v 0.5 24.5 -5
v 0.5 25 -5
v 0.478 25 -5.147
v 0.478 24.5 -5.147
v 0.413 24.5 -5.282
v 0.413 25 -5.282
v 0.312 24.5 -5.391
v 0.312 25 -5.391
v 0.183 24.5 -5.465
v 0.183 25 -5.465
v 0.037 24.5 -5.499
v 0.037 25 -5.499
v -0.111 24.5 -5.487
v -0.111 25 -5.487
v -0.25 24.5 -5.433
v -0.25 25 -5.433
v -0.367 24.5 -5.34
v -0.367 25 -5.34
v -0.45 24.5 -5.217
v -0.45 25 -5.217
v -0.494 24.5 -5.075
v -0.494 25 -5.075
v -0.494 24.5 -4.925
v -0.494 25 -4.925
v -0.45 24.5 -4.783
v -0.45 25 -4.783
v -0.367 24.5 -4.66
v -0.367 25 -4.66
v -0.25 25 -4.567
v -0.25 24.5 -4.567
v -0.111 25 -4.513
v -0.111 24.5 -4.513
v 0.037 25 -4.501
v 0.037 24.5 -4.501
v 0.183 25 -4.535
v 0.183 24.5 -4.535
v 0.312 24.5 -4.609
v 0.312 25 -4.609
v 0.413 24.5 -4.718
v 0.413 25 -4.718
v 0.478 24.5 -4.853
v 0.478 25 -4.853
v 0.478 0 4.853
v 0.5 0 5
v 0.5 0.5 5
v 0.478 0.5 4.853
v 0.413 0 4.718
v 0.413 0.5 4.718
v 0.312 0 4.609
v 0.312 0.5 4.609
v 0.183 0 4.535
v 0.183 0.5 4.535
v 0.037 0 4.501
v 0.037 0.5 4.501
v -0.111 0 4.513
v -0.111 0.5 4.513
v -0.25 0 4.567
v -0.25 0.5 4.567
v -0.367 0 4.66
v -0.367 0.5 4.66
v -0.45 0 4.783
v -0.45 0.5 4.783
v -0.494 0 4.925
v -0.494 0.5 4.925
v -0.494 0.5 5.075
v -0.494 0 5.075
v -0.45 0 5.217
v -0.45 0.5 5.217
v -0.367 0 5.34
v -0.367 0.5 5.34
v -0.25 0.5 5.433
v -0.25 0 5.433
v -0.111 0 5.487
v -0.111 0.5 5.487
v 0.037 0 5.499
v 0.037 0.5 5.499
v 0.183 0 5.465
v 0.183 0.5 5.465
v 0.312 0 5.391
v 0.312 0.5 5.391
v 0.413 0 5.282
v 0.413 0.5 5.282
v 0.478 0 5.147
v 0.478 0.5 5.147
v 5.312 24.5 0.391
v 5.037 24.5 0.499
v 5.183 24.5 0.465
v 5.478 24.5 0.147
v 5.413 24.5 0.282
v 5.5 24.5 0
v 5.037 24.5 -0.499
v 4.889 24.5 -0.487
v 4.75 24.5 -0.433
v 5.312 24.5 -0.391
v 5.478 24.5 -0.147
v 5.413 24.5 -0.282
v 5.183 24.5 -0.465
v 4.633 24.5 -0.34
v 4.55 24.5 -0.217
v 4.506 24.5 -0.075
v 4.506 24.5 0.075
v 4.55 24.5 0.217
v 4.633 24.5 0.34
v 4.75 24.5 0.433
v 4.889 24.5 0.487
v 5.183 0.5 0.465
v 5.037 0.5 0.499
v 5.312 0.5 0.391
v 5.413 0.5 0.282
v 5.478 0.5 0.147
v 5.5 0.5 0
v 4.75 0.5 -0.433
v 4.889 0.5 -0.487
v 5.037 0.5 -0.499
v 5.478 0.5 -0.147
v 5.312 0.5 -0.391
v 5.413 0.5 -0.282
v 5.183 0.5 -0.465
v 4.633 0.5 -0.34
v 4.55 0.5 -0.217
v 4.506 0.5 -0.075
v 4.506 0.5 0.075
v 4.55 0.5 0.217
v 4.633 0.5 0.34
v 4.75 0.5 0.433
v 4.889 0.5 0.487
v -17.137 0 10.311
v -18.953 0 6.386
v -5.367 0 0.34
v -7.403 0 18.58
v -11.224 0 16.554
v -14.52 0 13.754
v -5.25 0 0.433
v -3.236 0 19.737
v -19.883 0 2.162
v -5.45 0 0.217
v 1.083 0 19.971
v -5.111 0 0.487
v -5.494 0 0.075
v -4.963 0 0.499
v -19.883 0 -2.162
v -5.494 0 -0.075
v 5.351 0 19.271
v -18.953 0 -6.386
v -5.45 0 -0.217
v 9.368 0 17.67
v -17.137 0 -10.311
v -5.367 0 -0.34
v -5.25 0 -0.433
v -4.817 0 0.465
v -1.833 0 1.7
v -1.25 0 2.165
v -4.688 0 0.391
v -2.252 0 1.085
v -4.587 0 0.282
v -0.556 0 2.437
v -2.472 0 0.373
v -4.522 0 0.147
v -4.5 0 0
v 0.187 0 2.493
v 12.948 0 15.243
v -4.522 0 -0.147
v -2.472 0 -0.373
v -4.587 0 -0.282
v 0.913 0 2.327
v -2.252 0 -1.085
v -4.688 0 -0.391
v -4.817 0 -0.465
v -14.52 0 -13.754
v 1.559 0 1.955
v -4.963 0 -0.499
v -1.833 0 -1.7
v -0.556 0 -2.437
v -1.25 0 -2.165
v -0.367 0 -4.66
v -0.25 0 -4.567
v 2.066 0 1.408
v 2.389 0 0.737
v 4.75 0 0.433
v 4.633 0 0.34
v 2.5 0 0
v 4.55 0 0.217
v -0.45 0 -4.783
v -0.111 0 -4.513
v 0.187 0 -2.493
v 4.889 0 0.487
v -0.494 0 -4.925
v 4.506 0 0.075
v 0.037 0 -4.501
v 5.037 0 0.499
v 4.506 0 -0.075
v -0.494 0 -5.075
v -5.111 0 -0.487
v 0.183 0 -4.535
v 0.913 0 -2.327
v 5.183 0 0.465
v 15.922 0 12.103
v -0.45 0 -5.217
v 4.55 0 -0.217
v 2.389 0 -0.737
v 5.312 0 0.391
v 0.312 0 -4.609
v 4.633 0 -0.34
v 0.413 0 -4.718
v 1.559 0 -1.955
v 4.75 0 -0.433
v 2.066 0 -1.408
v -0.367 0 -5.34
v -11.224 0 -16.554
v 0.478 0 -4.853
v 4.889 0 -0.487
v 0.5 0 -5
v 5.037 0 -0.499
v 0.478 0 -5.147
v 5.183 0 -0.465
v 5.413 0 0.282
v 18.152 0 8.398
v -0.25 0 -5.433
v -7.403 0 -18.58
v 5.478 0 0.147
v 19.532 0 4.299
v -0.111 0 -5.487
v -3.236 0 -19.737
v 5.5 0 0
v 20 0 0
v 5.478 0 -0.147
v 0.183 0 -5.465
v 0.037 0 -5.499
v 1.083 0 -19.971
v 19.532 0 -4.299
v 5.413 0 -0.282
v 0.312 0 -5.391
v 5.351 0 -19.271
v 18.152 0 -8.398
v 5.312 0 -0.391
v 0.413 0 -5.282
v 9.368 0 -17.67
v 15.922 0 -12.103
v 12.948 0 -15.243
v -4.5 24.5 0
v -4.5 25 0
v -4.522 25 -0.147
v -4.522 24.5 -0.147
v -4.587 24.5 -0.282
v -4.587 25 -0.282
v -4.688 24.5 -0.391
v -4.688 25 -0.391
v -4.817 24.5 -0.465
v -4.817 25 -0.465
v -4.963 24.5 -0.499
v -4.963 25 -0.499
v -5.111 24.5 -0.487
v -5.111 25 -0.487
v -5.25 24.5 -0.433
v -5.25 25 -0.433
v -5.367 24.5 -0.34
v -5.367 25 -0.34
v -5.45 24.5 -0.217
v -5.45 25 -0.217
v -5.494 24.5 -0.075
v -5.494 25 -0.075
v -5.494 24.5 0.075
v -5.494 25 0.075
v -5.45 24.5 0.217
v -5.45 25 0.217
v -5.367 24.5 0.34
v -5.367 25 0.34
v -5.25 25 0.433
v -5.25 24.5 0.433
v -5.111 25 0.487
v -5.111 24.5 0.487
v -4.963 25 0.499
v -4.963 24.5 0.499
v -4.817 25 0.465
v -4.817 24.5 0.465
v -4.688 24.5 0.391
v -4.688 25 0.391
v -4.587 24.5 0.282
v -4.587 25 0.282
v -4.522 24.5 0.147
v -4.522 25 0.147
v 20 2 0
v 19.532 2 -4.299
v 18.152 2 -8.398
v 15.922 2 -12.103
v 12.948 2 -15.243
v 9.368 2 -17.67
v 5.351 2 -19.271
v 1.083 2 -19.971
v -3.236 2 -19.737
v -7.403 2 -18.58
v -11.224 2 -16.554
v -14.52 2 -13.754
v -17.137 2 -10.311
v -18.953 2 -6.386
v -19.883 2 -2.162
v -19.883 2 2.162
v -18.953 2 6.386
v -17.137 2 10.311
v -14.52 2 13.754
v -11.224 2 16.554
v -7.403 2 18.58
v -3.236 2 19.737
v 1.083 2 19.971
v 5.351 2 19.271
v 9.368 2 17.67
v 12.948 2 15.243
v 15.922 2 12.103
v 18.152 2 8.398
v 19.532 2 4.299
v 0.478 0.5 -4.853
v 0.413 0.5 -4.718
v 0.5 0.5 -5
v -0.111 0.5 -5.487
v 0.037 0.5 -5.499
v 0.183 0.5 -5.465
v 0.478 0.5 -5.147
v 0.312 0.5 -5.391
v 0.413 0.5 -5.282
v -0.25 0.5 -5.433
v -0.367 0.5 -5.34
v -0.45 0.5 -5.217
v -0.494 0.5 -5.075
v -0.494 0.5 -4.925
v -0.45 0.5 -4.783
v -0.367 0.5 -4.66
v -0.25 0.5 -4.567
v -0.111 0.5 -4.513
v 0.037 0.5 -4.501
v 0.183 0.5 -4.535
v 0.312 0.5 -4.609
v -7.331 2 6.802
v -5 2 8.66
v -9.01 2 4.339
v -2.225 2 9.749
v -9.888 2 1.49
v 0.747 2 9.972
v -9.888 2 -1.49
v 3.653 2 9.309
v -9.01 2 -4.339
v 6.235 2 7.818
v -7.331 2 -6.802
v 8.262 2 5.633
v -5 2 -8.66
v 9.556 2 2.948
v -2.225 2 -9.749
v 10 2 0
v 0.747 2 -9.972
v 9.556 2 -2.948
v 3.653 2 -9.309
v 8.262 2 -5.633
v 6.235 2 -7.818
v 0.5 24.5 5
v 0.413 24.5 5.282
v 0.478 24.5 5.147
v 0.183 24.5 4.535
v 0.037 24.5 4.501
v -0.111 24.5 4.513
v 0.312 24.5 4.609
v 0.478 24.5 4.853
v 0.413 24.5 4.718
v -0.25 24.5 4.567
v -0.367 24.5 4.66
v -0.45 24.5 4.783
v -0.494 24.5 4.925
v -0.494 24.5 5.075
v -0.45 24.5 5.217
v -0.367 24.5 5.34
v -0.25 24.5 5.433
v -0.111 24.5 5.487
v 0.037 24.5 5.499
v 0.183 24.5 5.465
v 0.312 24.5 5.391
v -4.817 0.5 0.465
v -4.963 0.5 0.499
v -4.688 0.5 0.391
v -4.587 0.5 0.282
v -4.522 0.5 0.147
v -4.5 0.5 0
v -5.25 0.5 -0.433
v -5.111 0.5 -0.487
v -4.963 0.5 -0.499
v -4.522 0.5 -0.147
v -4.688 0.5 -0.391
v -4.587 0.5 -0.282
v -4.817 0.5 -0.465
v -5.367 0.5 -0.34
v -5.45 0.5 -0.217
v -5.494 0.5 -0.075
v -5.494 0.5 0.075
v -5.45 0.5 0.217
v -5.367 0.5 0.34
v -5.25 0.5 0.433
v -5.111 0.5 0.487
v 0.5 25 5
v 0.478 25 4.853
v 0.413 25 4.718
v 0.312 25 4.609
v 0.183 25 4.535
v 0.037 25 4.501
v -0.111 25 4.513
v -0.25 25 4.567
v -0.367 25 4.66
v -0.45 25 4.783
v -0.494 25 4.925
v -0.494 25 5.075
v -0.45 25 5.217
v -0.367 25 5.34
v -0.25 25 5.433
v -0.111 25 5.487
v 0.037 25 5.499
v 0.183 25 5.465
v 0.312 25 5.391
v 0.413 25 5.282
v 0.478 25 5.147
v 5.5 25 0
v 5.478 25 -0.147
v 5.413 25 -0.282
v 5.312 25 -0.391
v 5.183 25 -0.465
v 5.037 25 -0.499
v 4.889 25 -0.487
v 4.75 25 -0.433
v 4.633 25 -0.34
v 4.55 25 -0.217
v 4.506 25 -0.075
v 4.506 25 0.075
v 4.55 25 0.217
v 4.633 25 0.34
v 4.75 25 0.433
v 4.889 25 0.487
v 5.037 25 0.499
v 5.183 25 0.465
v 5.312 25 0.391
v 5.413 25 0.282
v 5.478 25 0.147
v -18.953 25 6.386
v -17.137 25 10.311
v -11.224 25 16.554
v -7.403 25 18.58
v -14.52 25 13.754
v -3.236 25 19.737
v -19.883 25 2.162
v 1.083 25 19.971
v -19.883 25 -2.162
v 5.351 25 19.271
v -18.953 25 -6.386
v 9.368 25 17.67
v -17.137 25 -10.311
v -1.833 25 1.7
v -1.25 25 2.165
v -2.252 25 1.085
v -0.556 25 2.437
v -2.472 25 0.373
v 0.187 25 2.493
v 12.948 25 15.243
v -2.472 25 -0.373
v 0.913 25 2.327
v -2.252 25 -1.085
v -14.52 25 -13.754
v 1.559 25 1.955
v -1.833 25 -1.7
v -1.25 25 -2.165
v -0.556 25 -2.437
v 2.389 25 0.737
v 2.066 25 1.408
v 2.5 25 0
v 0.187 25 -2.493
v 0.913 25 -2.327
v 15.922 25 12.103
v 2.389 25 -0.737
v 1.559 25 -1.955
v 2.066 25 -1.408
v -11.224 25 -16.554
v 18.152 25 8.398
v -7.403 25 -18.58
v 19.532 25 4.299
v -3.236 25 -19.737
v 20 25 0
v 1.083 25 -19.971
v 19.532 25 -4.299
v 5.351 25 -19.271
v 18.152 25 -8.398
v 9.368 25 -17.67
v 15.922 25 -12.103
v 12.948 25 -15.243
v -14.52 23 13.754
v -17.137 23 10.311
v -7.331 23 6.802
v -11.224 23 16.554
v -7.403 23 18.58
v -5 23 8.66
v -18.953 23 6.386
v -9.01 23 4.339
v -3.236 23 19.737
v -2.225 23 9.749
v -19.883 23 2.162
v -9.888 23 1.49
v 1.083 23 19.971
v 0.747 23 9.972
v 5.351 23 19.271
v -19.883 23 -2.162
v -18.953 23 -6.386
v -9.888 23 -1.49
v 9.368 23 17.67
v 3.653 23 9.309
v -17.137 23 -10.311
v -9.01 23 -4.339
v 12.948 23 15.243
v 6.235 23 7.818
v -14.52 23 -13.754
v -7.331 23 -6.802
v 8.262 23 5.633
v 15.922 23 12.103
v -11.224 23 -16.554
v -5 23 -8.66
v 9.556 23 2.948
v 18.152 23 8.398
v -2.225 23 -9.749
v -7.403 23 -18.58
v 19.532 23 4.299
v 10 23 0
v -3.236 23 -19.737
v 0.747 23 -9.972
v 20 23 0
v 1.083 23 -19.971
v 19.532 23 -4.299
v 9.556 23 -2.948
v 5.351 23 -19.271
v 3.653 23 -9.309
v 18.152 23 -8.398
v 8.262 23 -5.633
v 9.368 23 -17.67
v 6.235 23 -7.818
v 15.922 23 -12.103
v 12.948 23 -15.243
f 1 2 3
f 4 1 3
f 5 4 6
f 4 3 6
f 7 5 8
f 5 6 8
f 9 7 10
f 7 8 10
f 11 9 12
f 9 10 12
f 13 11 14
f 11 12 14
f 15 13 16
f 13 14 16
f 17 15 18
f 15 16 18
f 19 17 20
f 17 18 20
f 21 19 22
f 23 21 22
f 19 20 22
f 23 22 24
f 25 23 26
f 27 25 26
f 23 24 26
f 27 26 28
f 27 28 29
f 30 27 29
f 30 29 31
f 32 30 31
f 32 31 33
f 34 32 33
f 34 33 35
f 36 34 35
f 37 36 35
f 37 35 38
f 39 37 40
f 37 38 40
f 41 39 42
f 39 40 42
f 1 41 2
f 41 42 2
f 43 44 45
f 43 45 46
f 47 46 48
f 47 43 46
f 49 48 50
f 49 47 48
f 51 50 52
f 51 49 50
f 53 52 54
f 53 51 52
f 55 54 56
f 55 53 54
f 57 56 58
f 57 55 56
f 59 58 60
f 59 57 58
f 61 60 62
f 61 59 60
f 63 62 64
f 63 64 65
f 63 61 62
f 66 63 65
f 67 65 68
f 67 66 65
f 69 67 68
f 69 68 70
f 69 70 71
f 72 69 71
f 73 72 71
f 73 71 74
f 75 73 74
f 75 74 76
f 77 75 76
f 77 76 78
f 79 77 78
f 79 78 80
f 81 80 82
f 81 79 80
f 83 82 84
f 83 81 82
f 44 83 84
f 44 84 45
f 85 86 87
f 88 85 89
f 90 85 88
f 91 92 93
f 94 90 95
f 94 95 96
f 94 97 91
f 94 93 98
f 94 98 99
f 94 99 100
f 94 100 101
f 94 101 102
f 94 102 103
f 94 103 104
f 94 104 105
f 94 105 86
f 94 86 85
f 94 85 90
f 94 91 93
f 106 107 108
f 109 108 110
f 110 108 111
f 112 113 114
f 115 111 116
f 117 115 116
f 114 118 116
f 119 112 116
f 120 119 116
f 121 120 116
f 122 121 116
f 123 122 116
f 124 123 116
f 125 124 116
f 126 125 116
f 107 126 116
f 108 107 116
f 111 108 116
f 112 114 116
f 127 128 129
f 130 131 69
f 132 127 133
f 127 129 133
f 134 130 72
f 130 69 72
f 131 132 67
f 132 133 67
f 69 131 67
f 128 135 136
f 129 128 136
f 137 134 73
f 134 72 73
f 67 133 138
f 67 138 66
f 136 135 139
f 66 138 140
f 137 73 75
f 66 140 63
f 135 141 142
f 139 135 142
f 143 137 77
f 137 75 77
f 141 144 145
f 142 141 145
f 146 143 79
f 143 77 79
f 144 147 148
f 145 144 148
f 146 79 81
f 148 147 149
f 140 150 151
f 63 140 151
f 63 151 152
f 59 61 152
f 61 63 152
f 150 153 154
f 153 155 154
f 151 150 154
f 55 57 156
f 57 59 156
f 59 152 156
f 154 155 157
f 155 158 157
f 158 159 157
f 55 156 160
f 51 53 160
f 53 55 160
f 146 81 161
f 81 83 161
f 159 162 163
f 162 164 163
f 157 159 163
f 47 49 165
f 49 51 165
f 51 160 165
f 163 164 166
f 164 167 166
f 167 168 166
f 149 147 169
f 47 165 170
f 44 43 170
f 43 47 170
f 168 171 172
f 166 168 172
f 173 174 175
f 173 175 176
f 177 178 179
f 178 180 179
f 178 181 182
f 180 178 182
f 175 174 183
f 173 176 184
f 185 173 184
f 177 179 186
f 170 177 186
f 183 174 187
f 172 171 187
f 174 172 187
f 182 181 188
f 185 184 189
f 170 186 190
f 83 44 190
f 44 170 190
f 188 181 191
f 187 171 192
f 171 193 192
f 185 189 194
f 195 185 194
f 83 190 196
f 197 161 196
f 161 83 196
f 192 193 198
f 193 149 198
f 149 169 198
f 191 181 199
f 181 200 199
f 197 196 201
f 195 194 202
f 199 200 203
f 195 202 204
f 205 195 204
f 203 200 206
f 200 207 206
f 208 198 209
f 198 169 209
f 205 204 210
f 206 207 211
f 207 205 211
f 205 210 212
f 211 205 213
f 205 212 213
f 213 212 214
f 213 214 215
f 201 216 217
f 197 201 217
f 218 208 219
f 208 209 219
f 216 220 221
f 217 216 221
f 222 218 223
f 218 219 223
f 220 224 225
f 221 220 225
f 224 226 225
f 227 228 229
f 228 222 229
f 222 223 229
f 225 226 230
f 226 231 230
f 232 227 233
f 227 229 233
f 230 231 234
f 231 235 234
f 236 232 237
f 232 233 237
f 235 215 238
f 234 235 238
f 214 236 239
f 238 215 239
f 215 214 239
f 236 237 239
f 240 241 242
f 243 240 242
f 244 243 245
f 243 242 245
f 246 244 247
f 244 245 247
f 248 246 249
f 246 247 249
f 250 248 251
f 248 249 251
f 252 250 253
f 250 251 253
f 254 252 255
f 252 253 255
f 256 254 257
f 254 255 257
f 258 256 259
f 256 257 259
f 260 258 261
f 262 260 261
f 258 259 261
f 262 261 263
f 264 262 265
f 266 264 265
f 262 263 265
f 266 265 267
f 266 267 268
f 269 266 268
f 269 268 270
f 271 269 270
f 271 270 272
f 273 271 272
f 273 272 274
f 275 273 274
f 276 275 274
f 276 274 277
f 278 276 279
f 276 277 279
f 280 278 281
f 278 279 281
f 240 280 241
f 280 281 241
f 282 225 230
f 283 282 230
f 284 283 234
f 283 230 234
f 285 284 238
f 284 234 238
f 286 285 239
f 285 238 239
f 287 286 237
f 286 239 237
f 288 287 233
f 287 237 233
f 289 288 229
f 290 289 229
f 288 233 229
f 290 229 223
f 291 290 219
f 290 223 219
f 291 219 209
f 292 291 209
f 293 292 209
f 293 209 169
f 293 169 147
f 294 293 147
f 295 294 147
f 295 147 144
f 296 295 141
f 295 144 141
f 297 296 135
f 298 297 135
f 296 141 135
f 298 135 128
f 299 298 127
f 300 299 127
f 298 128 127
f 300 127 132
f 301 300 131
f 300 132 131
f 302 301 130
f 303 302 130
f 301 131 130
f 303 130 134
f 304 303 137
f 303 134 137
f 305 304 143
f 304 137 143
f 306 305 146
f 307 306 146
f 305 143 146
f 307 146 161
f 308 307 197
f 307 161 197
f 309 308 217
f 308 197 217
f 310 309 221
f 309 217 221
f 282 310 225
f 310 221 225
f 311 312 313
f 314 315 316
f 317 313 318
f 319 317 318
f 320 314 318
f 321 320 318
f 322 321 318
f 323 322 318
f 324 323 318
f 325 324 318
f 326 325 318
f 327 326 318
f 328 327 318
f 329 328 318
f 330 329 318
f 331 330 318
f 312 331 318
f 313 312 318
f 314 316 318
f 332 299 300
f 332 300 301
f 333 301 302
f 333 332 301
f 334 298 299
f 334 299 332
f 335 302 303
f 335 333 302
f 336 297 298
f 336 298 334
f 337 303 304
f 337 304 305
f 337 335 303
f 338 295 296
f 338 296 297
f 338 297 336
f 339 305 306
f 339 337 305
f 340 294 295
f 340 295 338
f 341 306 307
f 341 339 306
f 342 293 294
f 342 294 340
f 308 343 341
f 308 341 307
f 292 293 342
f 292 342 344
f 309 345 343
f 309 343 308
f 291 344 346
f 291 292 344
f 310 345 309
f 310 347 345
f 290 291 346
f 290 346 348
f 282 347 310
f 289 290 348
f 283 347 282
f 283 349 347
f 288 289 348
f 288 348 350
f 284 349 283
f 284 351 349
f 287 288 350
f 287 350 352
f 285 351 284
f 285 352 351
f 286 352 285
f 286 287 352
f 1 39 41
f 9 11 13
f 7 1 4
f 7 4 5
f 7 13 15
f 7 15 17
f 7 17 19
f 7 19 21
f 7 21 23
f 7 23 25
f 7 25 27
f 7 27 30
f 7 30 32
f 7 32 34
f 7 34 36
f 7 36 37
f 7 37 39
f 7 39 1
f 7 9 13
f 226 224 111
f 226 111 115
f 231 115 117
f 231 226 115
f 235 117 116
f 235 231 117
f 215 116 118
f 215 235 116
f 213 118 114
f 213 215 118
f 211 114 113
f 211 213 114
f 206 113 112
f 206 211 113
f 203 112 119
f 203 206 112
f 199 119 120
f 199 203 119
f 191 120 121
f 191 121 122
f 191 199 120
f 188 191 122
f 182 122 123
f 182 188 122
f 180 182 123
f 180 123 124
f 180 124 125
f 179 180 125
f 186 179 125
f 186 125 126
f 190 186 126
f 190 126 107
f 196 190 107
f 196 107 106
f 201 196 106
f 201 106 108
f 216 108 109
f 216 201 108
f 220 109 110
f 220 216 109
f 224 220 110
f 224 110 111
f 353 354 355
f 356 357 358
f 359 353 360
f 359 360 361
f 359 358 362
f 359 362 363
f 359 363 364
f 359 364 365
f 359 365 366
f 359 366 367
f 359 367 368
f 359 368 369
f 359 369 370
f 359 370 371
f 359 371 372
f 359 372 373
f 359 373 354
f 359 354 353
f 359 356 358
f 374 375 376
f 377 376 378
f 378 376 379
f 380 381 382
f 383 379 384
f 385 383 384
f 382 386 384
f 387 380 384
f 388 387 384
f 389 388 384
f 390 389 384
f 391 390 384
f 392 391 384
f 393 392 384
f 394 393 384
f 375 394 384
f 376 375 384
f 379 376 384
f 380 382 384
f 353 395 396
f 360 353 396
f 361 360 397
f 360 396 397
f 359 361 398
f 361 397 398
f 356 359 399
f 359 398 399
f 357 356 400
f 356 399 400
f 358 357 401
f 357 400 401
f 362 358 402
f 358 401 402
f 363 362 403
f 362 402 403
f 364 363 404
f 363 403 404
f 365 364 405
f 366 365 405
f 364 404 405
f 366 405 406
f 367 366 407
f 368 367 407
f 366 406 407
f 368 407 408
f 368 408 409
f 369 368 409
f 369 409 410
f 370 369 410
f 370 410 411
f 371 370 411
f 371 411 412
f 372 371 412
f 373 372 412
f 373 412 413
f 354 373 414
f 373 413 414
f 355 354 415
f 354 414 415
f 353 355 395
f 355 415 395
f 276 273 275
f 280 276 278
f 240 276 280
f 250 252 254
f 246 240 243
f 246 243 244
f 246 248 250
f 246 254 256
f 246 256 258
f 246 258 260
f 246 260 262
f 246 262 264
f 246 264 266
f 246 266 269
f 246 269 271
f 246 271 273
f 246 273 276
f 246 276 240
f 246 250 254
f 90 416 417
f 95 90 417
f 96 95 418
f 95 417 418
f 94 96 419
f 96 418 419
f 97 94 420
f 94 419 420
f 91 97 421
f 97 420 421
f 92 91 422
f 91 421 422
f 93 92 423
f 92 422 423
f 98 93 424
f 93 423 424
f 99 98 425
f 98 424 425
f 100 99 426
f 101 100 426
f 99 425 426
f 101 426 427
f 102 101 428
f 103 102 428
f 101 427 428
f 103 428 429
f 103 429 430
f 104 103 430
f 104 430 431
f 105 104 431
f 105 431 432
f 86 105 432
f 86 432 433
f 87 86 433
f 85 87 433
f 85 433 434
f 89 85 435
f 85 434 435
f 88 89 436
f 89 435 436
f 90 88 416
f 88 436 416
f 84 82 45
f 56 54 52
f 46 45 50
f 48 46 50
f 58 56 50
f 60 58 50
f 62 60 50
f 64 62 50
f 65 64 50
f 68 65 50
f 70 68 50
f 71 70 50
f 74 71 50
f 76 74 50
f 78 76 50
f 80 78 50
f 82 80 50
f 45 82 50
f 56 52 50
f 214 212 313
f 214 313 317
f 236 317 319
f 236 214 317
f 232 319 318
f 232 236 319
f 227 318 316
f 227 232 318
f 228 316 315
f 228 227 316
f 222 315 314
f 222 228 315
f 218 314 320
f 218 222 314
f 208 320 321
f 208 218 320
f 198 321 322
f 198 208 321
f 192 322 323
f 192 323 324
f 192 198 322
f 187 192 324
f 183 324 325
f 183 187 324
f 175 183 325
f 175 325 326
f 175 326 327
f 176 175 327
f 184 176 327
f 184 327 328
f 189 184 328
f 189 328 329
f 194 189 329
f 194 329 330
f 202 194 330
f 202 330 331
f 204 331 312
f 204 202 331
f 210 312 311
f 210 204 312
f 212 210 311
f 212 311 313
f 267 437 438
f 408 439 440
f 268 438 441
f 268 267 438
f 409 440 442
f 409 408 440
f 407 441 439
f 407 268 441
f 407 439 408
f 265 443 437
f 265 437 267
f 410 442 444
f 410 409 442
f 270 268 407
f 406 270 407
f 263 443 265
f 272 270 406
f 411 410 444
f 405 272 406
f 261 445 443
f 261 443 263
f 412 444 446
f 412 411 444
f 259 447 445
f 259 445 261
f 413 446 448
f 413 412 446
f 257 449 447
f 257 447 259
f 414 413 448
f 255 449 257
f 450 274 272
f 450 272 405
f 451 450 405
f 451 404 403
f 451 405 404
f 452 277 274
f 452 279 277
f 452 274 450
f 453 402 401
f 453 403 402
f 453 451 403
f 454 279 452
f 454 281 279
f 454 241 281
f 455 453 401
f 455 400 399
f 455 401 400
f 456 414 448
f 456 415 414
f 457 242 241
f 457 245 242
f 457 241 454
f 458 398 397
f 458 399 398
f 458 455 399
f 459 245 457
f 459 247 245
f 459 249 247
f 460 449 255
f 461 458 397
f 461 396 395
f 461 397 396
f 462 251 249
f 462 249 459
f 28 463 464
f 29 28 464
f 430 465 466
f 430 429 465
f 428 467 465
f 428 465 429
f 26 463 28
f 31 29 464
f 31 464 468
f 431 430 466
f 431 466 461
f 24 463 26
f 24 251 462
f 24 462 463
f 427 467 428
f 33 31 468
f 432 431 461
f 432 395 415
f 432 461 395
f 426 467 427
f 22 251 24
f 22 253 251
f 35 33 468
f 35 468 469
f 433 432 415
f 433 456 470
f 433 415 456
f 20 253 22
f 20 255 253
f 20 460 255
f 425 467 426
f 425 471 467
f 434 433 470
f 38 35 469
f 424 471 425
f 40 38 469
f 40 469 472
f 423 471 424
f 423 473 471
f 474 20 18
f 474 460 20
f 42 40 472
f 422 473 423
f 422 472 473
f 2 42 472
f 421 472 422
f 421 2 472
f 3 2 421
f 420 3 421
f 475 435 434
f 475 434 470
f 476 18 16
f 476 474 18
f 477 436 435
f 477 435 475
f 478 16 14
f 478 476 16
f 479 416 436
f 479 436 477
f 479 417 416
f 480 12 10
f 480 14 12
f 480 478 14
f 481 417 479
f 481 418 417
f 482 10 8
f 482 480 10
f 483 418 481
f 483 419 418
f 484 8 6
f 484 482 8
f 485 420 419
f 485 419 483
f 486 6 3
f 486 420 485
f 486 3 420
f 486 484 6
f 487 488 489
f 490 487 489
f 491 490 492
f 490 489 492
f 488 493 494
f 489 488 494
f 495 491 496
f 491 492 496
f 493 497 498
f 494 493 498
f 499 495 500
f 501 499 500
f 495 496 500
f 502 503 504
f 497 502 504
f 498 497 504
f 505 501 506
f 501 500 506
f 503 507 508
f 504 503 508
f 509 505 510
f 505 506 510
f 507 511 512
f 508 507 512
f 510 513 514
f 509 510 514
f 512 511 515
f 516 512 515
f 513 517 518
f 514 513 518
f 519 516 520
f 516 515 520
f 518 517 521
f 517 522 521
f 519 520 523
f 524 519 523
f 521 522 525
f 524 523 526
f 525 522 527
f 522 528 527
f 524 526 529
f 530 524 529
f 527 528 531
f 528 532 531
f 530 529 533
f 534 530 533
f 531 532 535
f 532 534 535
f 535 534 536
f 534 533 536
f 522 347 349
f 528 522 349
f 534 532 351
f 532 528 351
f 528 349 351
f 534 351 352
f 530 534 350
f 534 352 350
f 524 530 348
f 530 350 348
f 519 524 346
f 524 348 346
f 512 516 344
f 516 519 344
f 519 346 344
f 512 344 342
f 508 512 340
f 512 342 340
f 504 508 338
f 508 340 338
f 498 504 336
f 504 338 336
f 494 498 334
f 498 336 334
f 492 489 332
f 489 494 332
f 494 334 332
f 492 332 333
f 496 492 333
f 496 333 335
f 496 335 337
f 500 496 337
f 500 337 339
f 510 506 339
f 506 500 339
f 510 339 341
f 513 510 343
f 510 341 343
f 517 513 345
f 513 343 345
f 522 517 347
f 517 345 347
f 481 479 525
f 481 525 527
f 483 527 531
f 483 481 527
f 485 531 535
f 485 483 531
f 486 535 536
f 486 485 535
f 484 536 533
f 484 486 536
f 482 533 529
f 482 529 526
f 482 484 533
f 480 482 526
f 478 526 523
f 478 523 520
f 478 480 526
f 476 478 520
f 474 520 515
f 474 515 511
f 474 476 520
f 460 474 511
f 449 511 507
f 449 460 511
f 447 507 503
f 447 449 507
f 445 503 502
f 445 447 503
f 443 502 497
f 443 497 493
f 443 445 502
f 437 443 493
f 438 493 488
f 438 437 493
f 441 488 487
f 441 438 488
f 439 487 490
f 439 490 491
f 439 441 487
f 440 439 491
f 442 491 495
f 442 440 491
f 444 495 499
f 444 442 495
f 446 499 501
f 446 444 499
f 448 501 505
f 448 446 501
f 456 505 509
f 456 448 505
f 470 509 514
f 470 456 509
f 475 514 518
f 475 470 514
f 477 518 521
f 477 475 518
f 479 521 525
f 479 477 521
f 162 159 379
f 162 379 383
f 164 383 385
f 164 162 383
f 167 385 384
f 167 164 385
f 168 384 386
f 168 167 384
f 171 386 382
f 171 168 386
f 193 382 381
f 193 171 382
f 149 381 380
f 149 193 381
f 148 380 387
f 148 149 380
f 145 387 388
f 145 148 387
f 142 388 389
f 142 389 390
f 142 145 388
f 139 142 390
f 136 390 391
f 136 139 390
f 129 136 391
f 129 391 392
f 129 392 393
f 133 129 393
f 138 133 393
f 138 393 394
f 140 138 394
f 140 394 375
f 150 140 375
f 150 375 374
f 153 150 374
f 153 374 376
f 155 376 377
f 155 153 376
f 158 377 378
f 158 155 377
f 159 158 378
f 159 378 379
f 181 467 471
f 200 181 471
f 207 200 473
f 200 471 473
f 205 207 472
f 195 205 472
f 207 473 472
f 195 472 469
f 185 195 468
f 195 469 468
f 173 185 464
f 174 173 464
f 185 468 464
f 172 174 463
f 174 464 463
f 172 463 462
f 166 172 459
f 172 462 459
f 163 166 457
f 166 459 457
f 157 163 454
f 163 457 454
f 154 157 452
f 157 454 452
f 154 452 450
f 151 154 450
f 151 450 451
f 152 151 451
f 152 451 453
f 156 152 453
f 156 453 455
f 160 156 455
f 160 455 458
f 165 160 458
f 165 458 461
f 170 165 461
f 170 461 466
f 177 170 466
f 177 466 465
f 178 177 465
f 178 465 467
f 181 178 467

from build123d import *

# Parameters (mm, degrees)
CROQUIS1_R              = 10
SALIENTE_EXTRUIR1_DEPTH = 25
CROQUIS2_R              = 20
SALIENTE_EXTRUIR2_DEPTH = 2
SALIENTE_EXTRUIR3_START = -23
CROQUIS2_2_R            = 20
SALIENTE_EXTRUIR3_DEPTH = 2
CROQUIS3_R              = 2.5
CORTAR_EXTRUIR1_DEPTH   = 38.749172176
CROQUIS4_R              = 0.5
CORTAR_EXTRUIR2_DEPTH   = 0.5
CORTAR_EXTRUIR3_START   = -24.5
CROQUIS4_2_R            = 0.5
CORTAR_EXTRUIR3_DEPTH   = 0.5


with BuildPart() as part:
    # Croquis1 → Saliente-Extruir1 (new body)
    with BuildSketch(Plane(origin=(0, 0, 0), x_dir=(1, 0, 0), z_dir=(0, 1, 0))):
        Circle(CROQUIS1_R)
    extrude(amount=SALIENTE_EXTRUIR1_DEPTH)

    # Croquis2 → Saliente-Extruir2 (add)
    with BuildSketch(Plane(origin=(0, 25, 0), x_dir=(1, 0, 0), z_dir=(0, 1, 0))):
        Circle(CROQUIS2_R)
    extrude(amount=-SALIENTE_EXTRUIR2_DEPTH)

    # Croquis2<2> → Saliente-Extruir3 (add)
    with BuildSketch(Plane(origin=(0, 25, 0), x_dir=(1, 0, 0), z_dir=(0, 1, 0)).offset(SALIENTE_EXTRUIR3_START)):
        Circle(CROQUIS2_2_R)
    extrude(amount=-SALIENTE_EXTRUIR3_DEPTH)

    # Croquis3 → Cortar-Extruir1 (cut, through all)
    with BuildSketch(Plane(origin=(0, 25, 0), x_dir=(1, 0, 0), z_dir=(0, 1, 0))):
        Circle(CROQUIS3_R)
    extrude(amount=-CORTAR_EXTRUIR1_DEPTH, mode=Mode.SUBTRACT)

    # Croquis4 → Cortar-Extruir2 (cut)
    with BuildSketch(Plane(origin=(0, 25, 0), x_dir=(1, 0, 0), z_dir=(0, 1, 0))):
        with Locations((0, 5)):
            Circle(CROQUIS4_R)
        with Locations((5, 0)):
            Circle(CROQUIS4_R)
        with Locations((0, -5)):
            Circle(CROQUIS4_R)
        with Locations((-5, 0)):
            Circle(CROQUIS4_R)
    extrude(amount=-CORTAR_EXTRUIR2_DEPTH, mode=Mode.SUBTRACT)

    # Croquis4<2> → Cortar-Extruir3 (cut)
    with BuildSketch(Plane(origin=(0, 25, 0), x_dir=(1, 0, 0), z_dir=(0, 1, 0)).offset(CORTAR_EXTRUIR3_START)):
        with Locations((0, 5)):
            Circle(CROQUIS4_2_R)
        with Locations((5, 0)):
            Circle(CROQUIS4_2_R)
        with Locations((0, -5)):
            Circle(CROQUIS4_2_R)
        with Locations((-5, 0)):
            Circle(CROQUIS4_2_R)
    extrude(amount=-CORTAR_EXTRUIR3_DEPTH, mode=Mode.SUBTRACT)


solid = part.part
